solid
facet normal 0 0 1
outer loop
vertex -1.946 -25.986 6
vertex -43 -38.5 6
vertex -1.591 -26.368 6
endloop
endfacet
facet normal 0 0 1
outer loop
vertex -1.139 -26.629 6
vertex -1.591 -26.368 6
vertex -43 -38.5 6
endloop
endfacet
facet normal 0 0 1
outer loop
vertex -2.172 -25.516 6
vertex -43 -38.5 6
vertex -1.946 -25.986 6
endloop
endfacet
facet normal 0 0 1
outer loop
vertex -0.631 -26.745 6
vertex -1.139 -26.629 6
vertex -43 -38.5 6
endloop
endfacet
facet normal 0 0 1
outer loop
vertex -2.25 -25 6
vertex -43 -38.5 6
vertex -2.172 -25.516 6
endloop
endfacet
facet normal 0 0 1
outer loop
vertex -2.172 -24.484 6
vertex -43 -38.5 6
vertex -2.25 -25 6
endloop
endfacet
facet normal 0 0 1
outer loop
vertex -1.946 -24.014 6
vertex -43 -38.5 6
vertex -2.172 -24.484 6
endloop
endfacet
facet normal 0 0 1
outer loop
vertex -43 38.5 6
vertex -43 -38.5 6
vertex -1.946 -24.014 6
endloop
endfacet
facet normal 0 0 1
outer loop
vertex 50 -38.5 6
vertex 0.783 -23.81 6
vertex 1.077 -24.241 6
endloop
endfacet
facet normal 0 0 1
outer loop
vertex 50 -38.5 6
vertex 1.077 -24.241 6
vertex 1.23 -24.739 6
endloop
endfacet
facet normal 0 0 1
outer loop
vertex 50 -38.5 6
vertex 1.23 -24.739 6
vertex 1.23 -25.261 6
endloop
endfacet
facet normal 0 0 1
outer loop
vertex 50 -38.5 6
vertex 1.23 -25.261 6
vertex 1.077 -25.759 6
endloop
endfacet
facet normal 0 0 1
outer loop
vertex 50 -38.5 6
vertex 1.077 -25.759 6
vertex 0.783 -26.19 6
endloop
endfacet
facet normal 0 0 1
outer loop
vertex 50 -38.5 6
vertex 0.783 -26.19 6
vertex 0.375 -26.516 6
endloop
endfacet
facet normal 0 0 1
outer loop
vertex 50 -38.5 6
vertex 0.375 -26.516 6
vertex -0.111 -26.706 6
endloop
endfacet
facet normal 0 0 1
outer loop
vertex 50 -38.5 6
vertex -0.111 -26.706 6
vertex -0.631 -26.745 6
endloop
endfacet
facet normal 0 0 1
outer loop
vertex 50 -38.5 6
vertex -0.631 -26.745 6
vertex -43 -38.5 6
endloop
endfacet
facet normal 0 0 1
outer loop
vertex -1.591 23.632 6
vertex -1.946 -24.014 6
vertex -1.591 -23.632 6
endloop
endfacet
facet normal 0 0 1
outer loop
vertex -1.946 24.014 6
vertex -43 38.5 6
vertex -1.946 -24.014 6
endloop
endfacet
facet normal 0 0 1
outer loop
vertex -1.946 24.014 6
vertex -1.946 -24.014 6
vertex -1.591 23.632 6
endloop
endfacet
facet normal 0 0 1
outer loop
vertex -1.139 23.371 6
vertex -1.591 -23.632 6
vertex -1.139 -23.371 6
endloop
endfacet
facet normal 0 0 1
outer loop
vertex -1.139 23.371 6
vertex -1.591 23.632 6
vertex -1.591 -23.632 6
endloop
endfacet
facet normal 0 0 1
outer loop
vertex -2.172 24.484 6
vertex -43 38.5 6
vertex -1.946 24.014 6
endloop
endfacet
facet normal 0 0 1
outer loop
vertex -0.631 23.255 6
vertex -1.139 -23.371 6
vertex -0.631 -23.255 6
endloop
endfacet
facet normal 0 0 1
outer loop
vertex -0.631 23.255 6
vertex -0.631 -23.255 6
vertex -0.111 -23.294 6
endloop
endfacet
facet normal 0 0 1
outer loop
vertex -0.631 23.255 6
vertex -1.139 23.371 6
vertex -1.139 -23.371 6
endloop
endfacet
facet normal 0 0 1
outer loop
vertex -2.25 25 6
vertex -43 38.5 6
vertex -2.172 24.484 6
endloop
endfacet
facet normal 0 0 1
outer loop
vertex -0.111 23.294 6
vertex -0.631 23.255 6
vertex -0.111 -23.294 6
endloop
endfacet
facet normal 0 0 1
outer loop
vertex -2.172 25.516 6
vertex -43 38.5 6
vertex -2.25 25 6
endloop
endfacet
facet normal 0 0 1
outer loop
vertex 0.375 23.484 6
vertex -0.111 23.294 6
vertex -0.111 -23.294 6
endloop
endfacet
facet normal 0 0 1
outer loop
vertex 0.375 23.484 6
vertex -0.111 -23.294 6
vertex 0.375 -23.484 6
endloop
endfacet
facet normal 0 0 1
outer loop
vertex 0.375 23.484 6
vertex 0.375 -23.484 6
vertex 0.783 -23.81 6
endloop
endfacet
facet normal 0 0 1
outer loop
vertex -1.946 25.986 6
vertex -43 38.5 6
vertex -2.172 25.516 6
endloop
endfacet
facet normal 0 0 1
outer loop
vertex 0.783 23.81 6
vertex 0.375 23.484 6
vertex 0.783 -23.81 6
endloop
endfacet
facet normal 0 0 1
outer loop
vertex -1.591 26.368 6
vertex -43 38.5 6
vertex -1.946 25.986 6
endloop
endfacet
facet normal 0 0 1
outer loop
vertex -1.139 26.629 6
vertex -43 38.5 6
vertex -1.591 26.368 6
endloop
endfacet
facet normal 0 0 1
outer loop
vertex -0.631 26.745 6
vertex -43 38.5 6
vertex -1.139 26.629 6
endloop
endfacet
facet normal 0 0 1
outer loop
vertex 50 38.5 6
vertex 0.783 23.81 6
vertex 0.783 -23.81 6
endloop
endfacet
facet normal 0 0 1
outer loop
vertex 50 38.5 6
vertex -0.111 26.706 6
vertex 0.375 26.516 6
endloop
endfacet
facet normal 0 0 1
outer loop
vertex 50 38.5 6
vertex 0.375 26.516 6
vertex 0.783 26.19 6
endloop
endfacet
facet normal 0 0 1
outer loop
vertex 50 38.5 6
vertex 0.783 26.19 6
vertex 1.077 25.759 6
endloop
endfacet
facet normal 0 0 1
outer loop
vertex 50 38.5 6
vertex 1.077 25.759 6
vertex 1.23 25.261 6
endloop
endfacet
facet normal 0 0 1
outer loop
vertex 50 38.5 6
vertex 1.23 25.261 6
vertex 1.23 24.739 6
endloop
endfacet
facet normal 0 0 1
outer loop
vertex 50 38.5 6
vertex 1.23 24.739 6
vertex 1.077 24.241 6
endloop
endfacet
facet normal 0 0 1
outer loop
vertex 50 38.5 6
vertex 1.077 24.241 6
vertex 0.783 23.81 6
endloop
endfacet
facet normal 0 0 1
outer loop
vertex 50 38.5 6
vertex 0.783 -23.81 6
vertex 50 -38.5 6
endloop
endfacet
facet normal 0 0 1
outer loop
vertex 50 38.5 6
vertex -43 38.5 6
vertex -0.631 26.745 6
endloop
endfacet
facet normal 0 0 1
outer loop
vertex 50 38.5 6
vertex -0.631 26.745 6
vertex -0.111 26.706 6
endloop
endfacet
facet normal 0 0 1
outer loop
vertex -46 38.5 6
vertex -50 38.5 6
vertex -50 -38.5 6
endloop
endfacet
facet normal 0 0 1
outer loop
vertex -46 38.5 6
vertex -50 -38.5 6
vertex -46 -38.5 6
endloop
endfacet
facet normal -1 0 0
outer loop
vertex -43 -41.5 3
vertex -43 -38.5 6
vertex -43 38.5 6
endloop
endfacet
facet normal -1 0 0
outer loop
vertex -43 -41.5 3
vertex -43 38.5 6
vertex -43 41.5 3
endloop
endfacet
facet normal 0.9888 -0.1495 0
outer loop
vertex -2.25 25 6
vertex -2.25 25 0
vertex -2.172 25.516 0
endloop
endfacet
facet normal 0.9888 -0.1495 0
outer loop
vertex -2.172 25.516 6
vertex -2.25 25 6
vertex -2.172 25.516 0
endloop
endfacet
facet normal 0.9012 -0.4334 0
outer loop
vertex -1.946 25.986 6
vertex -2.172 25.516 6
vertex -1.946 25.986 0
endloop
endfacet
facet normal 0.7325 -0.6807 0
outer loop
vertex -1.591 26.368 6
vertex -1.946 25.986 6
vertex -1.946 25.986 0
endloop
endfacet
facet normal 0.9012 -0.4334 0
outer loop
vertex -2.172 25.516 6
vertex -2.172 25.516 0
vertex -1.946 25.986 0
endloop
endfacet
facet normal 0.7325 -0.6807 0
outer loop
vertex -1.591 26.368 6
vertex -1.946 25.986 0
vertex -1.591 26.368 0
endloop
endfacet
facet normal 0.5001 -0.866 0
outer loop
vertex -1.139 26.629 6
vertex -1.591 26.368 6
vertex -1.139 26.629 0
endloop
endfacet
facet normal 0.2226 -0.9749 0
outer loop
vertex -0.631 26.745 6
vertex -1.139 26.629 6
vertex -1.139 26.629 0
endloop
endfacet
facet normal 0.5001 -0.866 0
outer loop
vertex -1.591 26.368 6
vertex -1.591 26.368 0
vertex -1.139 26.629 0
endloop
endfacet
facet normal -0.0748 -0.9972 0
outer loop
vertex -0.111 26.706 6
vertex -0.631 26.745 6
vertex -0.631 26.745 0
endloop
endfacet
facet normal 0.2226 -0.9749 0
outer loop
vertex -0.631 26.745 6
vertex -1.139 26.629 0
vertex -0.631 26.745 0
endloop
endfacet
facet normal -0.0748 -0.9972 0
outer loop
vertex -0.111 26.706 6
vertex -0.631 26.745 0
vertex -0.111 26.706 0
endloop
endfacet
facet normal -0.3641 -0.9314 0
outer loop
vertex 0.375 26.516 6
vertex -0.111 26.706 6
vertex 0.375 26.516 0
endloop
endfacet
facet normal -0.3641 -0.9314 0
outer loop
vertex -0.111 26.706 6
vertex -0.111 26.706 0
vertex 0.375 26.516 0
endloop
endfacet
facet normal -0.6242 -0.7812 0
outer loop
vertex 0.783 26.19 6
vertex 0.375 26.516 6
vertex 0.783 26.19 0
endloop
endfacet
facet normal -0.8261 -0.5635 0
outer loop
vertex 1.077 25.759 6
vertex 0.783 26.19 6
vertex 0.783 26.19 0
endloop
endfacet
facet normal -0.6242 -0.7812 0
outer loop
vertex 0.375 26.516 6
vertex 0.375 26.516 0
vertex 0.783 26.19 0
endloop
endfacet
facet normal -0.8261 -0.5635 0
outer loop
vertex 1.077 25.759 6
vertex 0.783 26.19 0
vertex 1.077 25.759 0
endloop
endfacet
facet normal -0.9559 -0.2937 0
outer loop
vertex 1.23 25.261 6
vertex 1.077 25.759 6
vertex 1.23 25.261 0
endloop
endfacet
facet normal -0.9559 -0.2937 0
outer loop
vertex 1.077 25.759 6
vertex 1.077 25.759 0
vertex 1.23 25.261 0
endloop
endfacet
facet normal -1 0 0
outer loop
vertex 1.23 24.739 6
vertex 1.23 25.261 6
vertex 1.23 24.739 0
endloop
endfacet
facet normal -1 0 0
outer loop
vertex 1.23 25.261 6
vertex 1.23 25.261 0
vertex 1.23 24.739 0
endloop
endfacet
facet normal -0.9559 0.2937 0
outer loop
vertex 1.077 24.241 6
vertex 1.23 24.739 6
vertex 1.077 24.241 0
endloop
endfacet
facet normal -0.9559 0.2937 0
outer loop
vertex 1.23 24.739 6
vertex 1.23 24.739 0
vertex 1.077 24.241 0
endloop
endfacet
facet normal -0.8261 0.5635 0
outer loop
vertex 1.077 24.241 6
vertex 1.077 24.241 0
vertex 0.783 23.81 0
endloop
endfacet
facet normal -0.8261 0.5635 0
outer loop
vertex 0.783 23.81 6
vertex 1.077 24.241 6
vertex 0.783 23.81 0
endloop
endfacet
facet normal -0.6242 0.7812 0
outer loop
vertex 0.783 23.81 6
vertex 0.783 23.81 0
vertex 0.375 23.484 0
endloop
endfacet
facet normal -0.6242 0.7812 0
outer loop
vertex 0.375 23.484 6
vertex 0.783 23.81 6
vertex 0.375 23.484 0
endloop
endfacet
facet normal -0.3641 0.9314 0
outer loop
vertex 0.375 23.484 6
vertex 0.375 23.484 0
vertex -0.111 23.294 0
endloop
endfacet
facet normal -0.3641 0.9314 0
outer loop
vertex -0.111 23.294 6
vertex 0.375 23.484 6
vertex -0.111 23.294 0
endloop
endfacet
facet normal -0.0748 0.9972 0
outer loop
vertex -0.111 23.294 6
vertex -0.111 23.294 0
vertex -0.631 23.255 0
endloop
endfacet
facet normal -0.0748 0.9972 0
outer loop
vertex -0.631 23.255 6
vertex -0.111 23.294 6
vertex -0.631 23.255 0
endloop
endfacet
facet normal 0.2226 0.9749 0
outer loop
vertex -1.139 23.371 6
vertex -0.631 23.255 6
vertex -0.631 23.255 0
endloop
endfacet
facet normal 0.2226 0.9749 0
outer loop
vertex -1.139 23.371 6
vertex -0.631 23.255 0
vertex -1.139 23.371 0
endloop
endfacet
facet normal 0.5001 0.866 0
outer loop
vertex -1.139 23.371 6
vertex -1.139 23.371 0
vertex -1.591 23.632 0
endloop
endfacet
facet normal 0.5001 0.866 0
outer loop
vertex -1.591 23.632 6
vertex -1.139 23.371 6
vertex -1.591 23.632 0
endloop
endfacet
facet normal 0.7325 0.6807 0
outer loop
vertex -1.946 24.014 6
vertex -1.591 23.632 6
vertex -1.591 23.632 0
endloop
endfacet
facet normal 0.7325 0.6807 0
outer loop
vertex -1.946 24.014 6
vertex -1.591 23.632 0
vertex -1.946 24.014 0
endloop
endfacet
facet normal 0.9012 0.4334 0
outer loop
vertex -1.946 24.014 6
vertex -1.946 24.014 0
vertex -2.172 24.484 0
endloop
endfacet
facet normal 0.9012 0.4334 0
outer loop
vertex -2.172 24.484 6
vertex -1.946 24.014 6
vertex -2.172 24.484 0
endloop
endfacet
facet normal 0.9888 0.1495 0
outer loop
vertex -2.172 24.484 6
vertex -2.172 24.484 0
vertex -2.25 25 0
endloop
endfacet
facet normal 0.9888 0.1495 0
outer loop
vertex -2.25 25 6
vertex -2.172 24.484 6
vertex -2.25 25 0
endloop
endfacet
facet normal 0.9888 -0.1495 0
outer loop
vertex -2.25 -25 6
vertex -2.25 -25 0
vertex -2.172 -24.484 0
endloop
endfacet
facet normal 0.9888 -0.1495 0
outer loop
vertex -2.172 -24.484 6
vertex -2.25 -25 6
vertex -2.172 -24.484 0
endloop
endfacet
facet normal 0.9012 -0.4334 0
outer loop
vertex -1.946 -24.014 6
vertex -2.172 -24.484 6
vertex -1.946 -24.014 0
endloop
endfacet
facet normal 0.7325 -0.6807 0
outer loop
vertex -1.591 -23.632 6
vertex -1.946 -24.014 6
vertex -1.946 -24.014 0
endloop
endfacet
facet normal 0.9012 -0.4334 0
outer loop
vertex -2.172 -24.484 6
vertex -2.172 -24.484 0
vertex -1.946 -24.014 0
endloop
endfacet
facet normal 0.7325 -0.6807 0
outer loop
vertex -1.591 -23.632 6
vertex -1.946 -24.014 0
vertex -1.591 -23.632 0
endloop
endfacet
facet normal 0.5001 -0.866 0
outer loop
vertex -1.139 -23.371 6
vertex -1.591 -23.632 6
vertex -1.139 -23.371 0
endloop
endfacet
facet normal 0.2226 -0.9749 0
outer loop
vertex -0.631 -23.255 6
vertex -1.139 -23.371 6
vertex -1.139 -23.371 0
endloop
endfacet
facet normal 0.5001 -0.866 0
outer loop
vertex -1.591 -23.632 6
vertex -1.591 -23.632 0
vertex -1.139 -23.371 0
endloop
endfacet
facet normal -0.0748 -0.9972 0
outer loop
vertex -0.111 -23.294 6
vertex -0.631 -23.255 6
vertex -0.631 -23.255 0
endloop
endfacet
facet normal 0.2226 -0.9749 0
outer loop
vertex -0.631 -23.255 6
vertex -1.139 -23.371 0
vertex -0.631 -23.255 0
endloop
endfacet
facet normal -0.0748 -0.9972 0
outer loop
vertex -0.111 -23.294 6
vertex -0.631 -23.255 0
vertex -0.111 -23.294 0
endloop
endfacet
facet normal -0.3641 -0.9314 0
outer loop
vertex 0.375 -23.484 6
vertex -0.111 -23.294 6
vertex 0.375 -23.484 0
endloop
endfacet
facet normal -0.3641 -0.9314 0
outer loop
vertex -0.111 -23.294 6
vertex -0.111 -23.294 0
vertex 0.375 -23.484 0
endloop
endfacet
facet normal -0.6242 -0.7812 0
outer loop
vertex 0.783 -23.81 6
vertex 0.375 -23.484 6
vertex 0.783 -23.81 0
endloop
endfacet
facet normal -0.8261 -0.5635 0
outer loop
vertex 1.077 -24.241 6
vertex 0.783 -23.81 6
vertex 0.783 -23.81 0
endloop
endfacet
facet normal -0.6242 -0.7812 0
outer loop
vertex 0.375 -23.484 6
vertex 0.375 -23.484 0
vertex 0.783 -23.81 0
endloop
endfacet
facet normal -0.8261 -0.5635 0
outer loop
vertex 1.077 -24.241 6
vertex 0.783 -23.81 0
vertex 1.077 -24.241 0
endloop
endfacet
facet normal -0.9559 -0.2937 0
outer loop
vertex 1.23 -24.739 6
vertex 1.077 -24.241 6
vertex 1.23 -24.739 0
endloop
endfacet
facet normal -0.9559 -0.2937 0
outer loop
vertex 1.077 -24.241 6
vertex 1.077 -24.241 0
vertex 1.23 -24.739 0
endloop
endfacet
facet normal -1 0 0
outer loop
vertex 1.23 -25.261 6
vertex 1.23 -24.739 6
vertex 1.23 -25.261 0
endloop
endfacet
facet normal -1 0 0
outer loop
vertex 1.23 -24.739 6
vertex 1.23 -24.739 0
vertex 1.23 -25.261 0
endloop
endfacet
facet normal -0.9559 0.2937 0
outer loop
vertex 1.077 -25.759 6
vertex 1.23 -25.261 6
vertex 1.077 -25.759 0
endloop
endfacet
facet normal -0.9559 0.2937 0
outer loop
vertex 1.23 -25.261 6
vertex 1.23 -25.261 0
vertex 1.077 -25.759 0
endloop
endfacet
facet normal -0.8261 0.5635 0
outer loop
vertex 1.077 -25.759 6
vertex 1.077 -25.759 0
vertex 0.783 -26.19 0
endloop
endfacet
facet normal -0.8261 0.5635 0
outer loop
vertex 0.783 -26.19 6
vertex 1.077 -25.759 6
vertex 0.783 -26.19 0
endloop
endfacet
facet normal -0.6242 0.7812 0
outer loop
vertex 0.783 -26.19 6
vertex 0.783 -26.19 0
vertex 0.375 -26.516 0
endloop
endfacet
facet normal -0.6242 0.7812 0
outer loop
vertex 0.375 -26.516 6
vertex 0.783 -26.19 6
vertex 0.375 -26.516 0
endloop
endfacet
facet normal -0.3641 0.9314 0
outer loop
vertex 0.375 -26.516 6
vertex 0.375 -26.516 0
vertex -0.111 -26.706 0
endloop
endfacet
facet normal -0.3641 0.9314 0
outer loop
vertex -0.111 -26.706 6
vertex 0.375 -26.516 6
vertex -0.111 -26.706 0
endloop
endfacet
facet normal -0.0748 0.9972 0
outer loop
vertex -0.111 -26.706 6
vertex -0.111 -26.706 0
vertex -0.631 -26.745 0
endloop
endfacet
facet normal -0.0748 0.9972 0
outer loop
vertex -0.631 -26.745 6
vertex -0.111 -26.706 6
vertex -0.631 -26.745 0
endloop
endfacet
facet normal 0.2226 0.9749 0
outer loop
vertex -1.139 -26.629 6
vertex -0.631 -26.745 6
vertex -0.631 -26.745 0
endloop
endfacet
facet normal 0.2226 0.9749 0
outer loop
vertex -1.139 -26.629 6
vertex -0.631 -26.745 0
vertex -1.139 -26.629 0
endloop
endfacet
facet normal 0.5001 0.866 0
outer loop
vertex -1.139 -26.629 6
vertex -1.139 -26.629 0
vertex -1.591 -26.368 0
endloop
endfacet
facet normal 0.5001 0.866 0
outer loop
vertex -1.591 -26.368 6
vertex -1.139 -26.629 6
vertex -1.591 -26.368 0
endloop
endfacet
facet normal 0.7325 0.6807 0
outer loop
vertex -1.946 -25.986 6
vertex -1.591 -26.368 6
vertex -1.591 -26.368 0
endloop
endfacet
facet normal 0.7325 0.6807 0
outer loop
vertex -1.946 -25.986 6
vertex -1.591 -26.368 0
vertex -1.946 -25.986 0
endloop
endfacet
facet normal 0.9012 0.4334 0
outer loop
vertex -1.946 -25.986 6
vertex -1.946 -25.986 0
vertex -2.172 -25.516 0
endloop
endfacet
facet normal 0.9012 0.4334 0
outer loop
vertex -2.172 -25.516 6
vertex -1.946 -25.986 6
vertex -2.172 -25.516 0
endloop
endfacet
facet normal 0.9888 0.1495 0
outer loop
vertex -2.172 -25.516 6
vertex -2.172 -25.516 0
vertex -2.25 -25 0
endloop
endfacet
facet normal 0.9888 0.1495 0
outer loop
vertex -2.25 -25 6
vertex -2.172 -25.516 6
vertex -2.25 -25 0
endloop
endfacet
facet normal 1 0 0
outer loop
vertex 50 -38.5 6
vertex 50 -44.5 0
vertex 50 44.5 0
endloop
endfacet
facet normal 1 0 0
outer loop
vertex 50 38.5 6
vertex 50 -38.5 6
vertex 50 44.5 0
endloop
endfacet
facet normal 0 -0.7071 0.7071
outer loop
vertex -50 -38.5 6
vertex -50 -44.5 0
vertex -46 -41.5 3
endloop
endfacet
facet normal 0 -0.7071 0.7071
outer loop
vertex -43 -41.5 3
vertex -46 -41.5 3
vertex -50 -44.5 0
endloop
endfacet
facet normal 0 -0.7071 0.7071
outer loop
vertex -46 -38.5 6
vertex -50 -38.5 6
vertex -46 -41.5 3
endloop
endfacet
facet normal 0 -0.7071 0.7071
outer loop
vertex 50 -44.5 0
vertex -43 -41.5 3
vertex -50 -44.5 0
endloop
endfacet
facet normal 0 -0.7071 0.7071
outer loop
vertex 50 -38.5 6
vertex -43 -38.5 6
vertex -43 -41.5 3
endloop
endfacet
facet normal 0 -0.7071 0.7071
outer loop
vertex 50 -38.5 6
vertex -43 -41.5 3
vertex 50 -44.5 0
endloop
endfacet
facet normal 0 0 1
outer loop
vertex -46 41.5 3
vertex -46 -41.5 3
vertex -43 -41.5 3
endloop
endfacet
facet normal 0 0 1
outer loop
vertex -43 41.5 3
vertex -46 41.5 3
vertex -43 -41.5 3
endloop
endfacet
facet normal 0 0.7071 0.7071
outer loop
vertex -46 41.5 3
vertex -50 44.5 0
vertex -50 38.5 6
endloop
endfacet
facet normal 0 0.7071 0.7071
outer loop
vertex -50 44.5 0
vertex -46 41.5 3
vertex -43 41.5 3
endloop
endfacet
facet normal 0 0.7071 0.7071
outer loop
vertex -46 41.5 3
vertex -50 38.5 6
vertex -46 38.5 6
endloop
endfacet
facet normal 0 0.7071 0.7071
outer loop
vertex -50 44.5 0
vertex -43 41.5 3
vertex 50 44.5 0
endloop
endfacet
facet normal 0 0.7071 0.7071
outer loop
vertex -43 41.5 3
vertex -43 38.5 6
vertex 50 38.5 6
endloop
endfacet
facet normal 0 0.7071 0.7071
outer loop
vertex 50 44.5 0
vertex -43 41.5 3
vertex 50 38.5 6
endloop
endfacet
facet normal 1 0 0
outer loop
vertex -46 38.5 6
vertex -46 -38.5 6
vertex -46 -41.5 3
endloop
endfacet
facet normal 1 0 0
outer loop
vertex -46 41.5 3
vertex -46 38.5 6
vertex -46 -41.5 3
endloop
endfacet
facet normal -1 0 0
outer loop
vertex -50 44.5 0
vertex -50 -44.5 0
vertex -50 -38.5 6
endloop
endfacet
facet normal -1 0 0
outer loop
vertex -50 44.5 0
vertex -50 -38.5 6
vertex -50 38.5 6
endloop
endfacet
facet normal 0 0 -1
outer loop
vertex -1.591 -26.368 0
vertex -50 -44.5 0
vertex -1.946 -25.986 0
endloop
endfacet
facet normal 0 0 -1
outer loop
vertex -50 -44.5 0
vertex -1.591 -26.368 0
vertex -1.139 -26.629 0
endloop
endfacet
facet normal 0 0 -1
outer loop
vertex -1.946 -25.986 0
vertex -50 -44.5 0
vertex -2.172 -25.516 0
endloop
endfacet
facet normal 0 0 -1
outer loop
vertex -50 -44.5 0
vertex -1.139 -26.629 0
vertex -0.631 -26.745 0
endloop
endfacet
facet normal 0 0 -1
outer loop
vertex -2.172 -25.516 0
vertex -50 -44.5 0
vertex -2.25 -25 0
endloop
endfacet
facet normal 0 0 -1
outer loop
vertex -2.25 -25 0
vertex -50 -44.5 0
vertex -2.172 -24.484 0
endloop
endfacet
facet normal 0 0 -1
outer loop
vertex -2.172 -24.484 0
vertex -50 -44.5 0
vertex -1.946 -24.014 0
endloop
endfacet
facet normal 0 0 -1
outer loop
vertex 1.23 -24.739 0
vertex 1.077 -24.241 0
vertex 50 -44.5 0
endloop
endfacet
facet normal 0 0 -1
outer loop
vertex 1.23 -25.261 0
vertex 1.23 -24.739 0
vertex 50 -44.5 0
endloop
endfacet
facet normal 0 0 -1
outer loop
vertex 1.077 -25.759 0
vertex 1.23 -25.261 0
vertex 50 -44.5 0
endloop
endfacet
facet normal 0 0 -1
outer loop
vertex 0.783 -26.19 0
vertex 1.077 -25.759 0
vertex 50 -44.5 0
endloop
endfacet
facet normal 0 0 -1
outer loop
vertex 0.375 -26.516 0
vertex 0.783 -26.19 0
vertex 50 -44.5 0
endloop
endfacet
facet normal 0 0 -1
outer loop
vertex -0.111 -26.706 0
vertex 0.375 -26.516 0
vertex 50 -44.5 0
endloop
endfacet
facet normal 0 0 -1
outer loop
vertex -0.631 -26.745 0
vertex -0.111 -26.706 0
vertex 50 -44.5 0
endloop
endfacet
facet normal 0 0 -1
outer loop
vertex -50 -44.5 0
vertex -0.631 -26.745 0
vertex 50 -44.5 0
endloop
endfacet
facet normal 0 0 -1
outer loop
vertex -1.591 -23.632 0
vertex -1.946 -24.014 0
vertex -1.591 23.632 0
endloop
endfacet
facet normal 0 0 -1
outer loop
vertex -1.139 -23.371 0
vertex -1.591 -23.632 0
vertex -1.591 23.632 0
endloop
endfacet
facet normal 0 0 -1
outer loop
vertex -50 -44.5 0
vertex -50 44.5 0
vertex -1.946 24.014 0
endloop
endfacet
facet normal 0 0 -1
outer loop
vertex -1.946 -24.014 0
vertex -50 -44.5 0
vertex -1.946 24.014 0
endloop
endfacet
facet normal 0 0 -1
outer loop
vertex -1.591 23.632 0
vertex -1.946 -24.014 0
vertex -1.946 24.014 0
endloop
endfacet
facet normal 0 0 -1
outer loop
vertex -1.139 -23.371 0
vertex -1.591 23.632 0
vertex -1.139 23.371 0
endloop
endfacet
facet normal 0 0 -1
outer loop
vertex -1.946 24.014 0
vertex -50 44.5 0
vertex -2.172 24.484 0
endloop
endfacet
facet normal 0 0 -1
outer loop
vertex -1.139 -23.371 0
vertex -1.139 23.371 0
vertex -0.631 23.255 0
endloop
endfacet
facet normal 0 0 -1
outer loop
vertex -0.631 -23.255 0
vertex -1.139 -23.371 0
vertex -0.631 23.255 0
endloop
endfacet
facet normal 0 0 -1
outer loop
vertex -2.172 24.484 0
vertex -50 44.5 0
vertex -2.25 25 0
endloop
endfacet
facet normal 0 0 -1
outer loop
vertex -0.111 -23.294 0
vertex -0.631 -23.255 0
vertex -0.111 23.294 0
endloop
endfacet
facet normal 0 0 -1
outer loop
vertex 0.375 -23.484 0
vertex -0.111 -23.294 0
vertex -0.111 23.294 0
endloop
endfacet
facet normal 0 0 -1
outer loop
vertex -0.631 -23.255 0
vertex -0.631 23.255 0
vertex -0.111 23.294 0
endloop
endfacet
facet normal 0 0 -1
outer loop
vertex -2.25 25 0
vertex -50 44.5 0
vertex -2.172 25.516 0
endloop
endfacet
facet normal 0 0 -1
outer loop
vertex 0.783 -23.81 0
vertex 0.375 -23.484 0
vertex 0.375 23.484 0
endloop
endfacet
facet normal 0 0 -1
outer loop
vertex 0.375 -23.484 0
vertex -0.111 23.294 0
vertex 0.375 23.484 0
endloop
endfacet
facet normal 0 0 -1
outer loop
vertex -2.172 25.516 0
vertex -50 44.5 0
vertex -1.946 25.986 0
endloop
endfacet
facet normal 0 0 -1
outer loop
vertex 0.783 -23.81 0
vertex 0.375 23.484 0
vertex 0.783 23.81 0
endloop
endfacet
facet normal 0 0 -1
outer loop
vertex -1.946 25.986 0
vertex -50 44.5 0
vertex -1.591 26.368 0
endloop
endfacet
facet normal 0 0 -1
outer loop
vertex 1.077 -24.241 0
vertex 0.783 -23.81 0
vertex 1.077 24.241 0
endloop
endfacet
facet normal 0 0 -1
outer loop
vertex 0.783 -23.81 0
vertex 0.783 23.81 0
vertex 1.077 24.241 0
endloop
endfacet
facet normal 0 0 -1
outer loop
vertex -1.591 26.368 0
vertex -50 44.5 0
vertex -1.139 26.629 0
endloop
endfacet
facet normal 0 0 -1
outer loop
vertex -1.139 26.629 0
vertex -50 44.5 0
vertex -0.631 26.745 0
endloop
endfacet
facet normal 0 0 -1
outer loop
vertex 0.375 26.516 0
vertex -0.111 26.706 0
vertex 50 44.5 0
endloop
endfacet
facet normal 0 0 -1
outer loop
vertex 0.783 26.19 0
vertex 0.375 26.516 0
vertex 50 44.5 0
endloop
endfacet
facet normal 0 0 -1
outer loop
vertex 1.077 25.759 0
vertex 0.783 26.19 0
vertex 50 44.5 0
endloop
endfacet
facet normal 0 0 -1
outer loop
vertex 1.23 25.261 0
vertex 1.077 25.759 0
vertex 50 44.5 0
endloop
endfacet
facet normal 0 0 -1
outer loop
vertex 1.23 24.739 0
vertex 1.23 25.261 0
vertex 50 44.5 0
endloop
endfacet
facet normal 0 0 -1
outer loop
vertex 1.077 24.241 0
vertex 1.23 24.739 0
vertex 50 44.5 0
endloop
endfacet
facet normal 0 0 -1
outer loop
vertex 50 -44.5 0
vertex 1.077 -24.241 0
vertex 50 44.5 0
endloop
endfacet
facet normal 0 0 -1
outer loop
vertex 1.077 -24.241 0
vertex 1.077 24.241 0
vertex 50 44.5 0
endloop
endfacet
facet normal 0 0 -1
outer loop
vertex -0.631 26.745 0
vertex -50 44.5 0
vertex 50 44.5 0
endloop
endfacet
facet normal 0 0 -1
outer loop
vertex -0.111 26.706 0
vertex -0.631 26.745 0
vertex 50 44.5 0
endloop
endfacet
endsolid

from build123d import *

# Parameters (mm, degrees)
SKETCH1_W           = 100
SKETCH1_H           = 89
BOSS_EXTRUDE1_DEPTH = 6
CHAMFER1_SIZE       = 6
SKETCH2_W           = 3
SKETCH2_H           = 89
CUT_EXTRUDE1_DEPTH  = 3
SKETCH4_R           = 1.75
CUT_EXTRUDE3_DEPTH  = 68.203050526


with BuildPart() as part:
    # Sketch1 → Boss-Extrude1 (new body)
    with BuildSketch(Plane.XY):
        Rectangle(SKETCH1_W, SKETCH1_H)
    extrude(amount=BOSS_EXTRUDE1_DEPTH)

    # Chamfer1
    chamfer1_edges = [part.edges().sort_by_distance(p)[0] for p in [
        (0, -44.5, 6),
        (0, 44.5, 6),
    ]]
    chamfer(chamfer1_edges, length=CHAMFER1_SIZE - 0.0001)  # a hair under: the kernel refuses the full size

    # Sketch2 → Cut-Extrude1 (cut)
    with BuildSketch(Plane.XY.offset(6)):
        with Locations((-44.5, 0)):
            Rectangle(SKETCH2_W, SKETCH2_H)
    extrude(amount=-CUT_EXTRUDE1_DEPTH, mode=Mode.SUBTRACT)

    # Sketch4 → Cut-Extrude3 (cut, through all)
    with BuildSketch(Plane(origin=(0, 0, 0), x_dir=(-1, 0, 0), z_dir=(0, 0, -1))):
        with Locations((0.5, 25)):
            Circle(SKETCH4_R)
        with Locations((0.5, -25)):
            Circle(SKETCH4_R)
    extrude(amount=-CUT_EXTRUDE3_DEPTH, mode=Mode.SUBTRACT)


solid = part.part
